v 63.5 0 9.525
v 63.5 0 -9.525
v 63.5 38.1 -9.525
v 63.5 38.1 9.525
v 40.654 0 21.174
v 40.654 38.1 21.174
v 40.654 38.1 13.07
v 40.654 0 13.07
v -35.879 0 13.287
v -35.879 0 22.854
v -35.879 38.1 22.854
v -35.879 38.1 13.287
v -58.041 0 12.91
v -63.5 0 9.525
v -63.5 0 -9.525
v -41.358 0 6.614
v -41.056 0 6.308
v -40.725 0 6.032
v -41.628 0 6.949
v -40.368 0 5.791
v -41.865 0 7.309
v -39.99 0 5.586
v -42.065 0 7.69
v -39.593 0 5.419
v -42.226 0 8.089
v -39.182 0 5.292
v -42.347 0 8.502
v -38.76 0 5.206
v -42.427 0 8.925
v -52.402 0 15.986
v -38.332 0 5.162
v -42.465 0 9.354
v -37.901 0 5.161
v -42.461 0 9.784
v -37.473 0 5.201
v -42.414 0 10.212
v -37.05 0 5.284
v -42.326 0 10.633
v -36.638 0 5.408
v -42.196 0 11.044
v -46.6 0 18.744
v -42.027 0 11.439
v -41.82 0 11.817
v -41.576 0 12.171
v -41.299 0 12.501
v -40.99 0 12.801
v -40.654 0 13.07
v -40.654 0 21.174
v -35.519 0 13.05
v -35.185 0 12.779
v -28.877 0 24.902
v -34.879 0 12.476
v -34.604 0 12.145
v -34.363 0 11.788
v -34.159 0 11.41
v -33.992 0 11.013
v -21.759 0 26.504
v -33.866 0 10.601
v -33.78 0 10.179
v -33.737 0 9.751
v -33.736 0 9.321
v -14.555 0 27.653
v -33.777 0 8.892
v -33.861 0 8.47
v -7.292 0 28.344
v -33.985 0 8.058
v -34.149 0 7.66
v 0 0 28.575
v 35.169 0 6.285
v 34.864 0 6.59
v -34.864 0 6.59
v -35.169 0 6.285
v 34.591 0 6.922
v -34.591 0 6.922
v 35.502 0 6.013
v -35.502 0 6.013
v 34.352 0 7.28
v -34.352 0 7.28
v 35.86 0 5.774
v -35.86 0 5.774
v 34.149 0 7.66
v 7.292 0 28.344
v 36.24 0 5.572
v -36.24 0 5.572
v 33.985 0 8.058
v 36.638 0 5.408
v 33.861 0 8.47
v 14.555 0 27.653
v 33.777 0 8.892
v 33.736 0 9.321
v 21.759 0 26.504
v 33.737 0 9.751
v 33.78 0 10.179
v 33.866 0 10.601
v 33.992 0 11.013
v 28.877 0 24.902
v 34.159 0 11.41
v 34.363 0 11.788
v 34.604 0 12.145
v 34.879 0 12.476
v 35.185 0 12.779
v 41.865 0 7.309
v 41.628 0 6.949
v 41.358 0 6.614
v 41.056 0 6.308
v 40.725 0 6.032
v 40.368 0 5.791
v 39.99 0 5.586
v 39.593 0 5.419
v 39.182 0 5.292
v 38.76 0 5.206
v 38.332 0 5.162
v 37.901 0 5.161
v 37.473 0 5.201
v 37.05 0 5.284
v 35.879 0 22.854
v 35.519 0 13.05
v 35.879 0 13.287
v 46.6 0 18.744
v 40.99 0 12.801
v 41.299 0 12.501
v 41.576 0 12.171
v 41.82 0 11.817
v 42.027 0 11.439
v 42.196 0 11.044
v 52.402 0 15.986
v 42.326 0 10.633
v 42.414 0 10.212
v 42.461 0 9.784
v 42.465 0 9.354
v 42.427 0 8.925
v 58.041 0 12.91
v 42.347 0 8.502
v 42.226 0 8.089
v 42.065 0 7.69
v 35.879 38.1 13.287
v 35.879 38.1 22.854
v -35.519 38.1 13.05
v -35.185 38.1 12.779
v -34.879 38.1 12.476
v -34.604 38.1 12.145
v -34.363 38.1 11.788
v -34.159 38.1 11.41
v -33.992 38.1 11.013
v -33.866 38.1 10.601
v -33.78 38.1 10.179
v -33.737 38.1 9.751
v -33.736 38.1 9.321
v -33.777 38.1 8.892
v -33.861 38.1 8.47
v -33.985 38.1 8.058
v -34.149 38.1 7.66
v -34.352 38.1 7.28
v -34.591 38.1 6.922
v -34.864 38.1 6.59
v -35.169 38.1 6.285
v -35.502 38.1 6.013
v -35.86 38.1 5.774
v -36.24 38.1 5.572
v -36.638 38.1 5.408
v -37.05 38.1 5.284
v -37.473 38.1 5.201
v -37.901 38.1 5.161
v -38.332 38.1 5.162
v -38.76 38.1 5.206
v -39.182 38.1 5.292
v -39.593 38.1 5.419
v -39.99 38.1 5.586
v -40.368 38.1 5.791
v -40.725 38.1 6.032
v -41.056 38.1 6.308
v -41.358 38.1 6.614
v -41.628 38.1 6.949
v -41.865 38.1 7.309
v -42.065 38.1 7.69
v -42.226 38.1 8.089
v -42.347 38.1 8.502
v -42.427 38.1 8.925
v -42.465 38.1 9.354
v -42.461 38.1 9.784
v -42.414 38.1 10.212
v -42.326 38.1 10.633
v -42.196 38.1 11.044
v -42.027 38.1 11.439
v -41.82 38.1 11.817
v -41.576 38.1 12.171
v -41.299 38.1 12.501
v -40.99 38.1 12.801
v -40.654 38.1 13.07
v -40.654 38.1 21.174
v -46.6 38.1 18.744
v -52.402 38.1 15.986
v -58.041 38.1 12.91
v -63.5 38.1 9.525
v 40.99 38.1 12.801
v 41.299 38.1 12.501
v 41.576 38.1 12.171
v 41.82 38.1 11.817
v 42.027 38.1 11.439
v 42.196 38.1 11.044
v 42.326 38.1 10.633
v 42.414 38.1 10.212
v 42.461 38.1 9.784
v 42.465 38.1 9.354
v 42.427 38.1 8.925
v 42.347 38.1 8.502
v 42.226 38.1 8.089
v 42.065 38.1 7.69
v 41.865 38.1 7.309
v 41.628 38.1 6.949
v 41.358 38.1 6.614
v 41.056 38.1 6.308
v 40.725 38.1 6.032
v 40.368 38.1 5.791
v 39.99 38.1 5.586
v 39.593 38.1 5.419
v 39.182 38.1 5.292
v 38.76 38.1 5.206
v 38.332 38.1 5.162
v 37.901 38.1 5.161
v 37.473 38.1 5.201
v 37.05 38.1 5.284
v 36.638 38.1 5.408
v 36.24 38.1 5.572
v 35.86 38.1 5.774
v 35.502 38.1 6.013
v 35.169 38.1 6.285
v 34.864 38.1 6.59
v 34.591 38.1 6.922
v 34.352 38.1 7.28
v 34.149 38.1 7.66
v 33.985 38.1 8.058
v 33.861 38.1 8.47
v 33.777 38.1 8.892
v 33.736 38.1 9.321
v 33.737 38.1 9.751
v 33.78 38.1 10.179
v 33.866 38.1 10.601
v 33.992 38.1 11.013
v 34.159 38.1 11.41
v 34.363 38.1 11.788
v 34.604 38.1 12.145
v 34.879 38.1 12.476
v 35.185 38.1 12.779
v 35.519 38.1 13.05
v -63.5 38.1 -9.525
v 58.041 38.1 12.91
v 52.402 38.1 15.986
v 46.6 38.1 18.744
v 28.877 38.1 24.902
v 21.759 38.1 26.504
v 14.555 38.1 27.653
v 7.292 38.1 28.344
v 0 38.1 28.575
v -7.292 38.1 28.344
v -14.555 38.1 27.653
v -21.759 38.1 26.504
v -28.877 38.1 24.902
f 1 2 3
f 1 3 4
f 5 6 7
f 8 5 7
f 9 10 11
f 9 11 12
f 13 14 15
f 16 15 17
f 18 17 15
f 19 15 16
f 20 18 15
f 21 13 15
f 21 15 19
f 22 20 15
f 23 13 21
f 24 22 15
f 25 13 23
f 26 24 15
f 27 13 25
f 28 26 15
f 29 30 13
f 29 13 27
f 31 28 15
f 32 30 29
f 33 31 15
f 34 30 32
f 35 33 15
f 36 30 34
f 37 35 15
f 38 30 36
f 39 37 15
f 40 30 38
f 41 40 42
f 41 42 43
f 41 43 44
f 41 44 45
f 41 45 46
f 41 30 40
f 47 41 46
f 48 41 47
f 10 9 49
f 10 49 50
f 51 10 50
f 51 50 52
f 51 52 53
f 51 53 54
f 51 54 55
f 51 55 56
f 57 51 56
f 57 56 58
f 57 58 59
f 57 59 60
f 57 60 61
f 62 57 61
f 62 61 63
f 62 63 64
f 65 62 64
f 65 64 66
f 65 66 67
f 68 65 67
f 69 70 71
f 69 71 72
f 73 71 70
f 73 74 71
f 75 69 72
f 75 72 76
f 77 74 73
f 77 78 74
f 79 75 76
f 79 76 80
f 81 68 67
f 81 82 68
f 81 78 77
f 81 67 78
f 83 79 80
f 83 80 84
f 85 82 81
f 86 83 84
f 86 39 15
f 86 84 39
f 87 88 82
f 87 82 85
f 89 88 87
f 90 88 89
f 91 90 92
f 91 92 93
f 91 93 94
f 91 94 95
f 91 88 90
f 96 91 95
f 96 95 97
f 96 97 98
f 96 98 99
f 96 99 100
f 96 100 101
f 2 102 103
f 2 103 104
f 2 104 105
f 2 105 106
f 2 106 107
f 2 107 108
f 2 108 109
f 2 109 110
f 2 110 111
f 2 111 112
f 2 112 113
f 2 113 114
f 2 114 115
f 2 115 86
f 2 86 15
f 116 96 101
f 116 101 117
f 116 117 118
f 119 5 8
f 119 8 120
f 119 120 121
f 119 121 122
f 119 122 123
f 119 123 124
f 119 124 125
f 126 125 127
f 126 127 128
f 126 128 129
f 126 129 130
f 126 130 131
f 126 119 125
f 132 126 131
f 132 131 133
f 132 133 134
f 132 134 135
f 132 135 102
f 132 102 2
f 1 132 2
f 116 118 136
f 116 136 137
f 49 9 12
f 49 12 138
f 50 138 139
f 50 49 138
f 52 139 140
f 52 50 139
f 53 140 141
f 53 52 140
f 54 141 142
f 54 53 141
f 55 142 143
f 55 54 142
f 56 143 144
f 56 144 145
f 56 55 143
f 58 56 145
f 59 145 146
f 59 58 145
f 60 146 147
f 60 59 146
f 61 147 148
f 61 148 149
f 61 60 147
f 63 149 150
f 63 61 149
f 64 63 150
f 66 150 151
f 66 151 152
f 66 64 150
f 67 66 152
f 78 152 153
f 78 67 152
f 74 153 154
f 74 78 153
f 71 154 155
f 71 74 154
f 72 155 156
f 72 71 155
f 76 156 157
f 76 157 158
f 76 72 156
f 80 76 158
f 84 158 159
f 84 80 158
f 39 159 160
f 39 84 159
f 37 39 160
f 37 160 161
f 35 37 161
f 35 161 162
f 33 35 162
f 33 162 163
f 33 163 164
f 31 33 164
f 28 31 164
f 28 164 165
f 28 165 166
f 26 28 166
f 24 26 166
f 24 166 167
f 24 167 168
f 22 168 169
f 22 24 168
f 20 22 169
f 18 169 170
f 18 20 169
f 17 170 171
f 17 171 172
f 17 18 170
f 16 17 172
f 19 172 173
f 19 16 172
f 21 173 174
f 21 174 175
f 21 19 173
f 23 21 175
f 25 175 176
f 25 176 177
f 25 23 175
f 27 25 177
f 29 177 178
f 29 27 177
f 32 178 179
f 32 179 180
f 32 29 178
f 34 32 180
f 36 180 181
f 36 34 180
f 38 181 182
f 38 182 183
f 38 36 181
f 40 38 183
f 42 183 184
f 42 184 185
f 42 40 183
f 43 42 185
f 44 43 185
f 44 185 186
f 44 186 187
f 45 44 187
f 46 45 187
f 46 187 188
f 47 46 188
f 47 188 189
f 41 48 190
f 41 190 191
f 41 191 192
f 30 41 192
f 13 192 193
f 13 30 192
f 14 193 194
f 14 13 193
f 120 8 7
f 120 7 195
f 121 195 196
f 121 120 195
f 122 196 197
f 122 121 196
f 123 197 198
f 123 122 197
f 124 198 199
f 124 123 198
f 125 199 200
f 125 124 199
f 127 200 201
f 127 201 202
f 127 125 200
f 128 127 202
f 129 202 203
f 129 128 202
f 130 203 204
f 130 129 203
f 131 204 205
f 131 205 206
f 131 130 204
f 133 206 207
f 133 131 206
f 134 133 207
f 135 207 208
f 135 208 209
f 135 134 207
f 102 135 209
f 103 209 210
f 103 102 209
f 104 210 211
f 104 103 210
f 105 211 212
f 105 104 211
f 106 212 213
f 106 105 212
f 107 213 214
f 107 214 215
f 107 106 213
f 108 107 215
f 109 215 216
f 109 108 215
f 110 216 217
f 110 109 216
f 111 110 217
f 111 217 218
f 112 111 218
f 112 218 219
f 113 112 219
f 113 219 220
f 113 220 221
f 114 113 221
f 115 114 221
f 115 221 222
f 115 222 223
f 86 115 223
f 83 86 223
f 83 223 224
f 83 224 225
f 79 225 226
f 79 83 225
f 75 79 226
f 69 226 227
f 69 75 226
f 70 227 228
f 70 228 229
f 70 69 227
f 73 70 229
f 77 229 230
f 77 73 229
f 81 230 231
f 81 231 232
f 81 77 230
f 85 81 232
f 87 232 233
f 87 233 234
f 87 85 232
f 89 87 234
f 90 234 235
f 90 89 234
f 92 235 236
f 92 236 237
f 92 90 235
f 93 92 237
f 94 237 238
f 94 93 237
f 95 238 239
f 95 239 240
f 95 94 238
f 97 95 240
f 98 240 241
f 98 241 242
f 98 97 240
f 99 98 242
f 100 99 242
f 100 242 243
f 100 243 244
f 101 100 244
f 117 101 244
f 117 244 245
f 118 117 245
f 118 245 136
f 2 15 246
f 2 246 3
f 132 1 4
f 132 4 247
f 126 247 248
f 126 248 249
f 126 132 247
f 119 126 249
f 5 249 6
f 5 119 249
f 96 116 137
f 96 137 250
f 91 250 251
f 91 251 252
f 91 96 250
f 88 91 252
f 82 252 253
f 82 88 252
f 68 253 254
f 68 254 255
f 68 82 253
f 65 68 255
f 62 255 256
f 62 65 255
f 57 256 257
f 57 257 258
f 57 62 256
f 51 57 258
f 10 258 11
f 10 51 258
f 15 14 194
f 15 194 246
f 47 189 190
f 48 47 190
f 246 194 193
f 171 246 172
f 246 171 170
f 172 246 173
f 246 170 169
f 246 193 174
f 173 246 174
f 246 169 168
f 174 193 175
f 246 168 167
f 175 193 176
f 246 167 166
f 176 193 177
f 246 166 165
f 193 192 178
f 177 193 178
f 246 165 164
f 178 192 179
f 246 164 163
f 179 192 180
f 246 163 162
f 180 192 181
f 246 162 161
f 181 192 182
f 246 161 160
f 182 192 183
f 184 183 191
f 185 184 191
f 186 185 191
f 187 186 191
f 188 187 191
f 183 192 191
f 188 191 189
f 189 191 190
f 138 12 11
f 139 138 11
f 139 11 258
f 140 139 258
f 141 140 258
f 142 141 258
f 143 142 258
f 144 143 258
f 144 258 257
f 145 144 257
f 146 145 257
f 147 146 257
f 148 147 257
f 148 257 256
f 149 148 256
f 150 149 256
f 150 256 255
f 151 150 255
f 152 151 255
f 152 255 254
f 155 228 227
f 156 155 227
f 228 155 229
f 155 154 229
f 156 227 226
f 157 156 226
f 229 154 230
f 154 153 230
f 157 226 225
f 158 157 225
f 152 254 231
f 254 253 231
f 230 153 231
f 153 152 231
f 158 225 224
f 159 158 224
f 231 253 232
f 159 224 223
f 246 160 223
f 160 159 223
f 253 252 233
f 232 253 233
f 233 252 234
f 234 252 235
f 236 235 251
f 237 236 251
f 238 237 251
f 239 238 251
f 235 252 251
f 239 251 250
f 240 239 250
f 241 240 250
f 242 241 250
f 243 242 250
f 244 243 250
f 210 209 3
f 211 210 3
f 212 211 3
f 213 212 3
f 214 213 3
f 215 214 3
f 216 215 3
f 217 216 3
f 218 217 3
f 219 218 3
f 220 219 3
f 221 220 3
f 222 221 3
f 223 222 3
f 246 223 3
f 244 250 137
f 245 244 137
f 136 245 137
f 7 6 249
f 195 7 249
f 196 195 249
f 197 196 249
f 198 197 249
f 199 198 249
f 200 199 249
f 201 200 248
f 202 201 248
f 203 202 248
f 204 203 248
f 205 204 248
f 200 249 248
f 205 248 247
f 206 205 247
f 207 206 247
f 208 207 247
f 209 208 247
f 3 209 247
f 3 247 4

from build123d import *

# Parameters (mm, degrees)
F1_DEPTH = 38.1


with BuildPart() as f1:
    # F0 (on Front) → F1 (new body)
    with BuildSketch(Plane.XZ):
        with BuildLine():
            Line((-63.5, -9.525), (63.5, -9.525))
            Line((63.5, -9.525), (63.5, 9.525))
            ThreePointArc((63.5, 9.525), (52.401686, 15.986353), (40.653953, 21.174071))
            Line((40.653953, 21.174071), (40.653953, 13.069536))
            ThreePointArc((40.653953, 13.069536), (37.901271, 5.160722), (35.878753, 13.286977))
            Line((35.878753, 13.286977), (35.878753, 22.853614))
            ThreePointArc((35.878753, 22.853614), (0, 28.575), (-35.878753, 22.853614))
            Line((-35.878753, 22.853614), (-35.878753, 13.286977))
            ThreePointArc((-35.878753, 13.286977), (-37.901271, 5.160722), (-40.653953, 13.069536))
            Line((-40.653953, 13.069536), (-40.653953, 21.174071))
            ThreePointArc((-40.653953, 21.174071), (-52.401686, 15.986353), (-63.5, 9.525))
            Line((-63.5, 9.525), (-63.5, -9.525))
        make_face()
    extrude(amount=-F1_DEPTH)


solid = f1.part
